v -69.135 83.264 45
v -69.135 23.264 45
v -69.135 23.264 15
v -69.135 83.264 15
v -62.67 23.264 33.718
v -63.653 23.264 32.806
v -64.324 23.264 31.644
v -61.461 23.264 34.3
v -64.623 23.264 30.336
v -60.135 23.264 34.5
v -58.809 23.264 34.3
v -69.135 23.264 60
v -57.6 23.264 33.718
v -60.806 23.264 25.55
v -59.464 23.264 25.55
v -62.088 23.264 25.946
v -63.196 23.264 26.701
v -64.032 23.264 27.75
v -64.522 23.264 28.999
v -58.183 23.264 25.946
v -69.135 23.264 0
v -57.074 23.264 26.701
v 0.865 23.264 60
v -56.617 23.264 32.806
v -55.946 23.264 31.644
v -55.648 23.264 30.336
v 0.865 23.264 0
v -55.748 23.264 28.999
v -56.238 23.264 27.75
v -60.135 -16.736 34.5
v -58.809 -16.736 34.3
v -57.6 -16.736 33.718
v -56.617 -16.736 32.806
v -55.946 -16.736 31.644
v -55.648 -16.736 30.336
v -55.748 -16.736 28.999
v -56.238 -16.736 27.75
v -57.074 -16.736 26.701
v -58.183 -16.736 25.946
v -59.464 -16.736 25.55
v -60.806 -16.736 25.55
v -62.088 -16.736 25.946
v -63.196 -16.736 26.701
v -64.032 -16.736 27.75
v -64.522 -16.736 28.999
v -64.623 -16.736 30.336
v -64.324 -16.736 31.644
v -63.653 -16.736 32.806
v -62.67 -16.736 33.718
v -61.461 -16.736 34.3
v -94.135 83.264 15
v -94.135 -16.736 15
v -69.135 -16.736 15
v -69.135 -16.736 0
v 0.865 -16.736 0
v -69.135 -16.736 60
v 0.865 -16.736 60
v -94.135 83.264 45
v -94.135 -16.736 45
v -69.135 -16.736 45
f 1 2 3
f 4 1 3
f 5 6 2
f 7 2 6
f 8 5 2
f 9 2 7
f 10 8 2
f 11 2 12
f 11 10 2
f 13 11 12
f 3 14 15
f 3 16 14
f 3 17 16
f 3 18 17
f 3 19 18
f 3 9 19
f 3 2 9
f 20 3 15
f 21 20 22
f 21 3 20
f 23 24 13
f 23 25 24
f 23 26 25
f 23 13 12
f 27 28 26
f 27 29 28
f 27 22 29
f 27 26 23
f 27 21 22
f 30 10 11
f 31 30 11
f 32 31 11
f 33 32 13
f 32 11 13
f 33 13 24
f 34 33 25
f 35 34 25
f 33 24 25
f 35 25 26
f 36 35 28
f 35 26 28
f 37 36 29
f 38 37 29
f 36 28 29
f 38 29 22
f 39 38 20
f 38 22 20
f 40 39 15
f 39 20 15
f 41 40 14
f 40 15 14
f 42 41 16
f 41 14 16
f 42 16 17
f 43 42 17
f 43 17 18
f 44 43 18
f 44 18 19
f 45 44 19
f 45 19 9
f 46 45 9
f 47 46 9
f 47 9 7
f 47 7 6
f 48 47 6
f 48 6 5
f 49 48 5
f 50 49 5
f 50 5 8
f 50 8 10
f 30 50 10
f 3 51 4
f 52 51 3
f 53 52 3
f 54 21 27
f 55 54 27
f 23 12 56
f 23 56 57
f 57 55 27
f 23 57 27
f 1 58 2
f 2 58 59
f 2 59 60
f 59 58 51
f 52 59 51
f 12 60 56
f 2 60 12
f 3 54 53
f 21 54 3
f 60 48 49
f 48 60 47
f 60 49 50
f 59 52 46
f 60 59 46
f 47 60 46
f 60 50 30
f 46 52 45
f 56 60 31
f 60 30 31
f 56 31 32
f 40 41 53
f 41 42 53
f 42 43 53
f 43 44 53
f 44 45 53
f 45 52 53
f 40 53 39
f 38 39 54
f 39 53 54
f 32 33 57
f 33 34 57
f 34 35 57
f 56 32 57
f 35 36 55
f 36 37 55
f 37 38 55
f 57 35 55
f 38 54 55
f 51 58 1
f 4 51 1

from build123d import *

# Parameters (mm, degrees)
ESQUISSE1_W             = 70
ESQUISSE1_H             = 40
BOSS_EXTRU_1_DEPTH      = 60
ESQUISSE2_R             = 4.5
ENL_V_MAT_EXTRU_1_DEPTH = 60
ESQUISSE3_W             = 30
ESQUISSE3_H             = 40
BOSS_EXTRU_2_DEPTH      = 25
ESQUISSE4_W             = 25
ESQUISSE4_H             = 30
BOSS_EXTRU_3_DEPTH      = 60


with BuildPart() as part:
    # Esquisse1 → Boss.-Extru.1 (new body)
    with BuildSketch(Plane.XY):
        with Locations((-34.135092282, 3.264127517)):
            Rectangle(ESQUISSE1_W, ESQUISSE1_H)
    extrude(amount=BOSS_EXTRU_1_DEPTH)

    # Esquisse2 → Enlèv. mat.-Extru.1 (cut)
    with BuildSketch(Plane(origin=(0, 23.264127517, 0), x_dir=(1, 0, 0), z_dir=(0, 1, 0))):
        with Locations(Location((-60.135092282, -30, 0), (0, 0, 270))):
            Circle(ESQUISSE2_R)
    extrude(amount=-ENL_V_MAT_EXTRU_1_DEPTH, mode=Mode.SUBTRACT)

    # Esquisse3 → Boss.-Extru.2 (add)
    with BuildSketch(Plane.ZY.offset(69.135092282)):
        with Locations((30, 3.264127517)):
            Rectangle(ESQUISSE3_W, ESQUISSE3_H)
    extrude(amount=BOSS_EXTRU_2_DEPTH)

    # Esquisse4 → Boss.-Extru.3 (add)
    with BuildSketch(Plane(origin=(0, 23.264127517, 0), x_dir=(1, 0, 0), z_dir=(0, 1, 0))):
        with Locations((-81.635092282, -30)):
            Rectangle(ESQUISSE4_W, ESQUISSE4_H)
    extrude(amount=BOSS_EXTRU_3_DEPTH)


solid = part.part
